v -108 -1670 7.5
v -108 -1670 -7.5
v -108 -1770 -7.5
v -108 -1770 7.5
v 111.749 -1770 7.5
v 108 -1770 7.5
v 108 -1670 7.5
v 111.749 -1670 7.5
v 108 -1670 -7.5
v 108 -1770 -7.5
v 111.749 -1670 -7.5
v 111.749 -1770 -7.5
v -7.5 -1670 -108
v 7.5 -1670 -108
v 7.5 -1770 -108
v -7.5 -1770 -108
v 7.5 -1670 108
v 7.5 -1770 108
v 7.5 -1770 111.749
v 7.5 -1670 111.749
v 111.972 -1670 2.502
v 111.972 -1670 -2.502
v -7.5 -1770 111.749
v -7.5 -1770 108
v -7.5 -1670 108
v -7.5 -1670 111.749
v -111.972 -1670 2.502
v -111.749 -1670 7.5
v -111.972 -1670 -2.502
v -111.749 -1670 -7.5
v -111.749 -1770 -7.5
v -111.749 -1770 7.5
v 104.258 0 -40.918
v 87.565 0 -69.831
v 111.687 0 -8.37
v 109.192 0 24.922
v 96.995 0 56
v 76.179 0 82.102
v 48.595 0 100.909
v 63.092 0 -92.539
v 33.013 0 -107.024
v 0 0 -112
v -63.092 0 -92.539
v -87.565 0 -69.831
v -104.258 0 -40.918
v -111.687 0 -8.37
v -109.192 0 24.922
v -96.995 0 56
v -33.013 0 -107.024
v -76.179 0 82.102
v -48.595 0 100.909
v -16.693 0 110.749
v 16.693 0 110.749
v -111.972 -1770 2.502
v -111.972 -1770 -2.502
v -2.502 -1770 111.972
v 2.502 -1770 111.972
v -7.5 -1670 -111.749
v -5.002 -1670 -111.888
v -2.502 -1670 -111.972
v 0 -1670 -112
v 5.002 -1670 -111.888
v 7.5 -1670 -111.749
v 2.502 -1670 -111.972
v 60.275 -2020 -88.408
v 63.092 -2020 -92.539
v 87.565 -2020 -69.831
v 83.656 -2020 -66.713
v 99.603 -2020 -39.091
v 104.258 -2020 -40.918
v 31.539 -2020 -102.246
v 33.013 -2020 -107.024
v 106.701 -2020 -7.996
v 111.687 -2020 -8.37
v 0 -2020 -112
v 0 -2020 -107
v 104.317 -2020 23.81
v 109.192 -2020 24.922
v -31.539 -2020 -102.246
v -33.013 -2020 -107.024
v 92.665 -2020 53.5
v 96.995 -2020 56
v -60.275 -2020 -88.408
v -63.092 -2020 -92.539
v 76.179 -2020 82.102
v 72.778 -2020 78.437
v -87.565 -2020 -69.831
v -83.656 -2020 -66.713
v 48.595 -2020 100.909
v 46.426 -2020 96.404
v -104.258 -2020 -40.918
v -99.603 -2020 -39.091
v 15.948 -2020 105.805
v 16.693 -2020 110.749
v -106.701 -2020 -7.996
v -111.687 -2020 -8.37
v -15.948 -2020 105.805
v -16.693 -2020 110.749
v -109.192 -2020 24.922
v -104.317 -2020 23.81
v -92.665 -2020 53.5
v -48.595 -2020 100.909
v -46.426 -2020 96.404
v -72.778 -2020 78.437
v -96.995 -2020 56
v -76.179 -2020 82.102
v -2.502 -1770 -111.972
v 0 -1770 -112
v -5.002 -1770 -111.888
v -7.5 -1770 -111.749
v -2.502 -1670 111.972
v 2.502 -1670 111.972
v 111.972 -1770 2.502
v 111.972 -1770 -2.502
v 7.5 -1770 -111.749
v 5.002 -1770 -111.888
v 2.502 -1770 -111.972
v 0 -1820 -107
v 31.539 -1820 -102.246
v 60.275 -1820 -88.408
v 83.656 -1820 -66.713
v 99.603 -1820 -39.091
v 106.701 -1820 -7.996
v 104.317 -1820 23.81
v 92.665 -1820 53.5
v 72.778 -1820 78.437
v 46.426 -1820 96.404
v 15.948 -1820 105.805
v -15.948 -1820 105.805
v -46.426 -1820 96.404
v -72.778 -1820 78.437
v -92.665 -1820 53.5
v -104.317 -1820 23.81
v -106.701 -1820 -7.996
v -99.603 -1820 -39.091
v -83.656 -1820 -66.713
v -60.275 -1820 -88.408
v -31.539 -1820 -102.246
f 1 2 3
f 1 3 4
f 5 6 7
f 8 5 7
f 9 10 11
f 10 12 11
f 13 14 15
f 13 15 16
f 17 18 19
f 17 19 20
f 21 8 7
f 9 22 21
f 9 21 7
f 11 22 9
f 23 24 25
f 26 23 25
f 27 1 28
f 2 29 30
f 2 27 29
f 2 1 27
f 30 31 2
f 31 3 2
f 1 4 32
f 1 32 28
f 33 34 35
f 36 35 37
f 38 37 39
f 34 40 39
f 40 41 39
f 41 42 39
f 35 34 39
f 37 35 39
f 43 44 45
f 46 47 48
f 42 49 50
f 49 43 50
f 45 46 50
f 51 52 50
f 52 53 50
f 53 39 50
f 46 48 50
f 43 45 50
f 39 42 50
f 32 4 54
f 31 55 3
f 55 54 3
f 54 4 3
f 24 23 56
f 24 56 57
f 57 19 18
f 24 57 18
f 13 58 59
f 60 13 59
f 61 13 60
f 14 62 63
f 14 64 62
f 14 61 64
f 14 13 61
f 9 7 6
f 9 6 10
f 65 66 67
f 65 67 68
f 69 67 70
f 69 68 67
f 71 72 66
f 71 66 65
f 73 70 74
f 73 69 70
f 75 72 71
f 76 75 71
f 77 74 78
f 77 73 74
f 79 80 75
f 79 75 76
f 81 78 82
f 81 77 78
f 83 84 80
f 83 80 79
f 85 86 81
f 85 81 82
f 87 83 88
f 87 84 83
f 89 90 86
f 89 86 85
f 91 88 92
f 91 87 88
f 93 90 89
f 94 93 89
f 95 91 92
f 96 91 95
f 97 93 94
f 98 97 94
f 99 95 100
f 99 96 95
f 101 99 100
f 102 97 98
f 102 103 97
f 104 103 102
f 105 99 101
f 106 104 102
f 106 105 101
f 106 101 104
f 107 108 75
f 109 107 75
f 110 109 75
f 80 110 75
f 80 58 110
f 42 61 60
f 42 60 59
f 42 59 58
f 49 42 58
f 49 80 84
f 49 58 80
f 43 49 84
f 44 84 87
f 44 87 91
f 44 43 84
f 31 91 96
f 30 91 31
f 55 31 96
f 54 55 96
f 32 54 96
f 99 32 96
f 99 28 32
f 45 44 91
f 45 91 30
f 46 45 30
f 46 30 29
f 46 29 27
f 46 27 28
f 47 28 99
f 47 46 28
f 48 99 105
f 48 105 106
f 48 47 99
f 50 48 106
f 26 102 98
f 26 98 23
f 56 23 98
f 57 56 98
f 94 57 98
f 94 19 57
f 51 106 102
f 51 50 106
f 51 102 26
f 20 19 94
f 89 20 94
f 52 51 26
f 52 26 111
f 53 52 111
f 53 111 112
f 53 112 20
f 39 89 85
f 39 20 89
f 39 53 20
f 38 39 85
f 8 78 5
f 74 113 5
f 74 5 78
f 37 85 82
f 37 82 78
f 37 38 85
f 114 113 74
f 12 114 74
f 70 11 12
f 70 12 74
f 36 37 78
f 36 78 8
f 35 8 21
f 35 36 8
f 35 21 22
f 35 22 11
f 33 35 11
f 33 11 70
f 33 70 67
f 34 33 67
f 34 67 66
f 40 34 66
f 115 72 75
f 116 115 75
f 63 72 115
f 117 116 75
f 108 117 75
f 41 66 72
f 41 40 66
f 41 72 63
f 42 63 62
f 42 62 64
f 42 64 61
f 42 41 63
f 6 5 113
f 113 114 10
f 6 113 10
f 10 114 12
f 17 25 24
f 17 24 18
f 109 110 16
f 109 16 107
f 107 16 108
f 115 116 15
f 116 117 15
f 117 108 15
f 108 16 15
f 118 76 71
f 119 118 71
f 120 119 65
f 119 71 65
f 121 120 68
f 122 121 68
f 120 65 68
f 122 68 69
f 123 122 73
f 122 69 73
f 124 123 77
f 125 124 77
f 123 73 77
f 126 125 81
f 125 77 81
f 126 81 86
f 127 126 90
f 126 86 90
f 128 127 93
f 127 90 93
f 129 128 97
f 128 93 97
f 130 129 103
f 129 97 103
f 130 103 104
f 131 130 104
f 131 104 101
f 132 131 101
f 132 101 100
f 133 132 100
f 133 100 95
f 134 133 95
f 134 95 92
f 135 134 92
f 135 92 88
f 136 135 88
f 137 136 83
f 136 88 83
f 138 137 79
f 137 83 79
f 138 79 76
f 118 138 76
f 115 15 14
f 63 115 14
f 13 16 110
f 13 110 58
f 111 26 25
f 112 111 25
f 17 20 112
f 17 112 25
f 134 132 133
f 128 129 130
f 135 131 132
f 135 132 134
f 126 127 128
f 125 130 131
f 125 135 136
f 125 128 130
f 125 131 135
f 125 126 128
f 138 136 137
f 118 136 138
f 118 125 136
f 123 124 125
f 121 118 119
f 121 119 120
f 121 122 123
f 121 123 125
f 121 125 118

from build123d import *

# Parameters (mm, degrees)
SKETCH1_W           = 112
SKETCH1_H           = 2020
SKETCH2_W           = 15
SKETCH2_H           = 100
CUT_EXTRUDE1_DEPTH  = 132
SKETCH3_W           = 15
SKETCH3_H           = 100
BOSS_EXTRUDE1_DEPTH = 108
CIRPATTERN1_COUNT   = 4
SKETCH4_R           = 107
CUT_EXTRUDE2_DEPTH  = 200


with BuildPart() as part:
    # Sketch1 → Revolve1 (revolve)
    with BuildSketch(Plane.XY, mode=Mode.PRIVATE) as revolve1_sk:
        with Locations((56, -1010)):
            Rectangle(SKETCH1_W, SKETCH1_H)
    revolve(revolve1_sk.sketch.rotate(Axis((0, -2406.253229974, 0), (0, 1, 0)), 90), axis=Axis((0, -2406.253229974, 0), (0, 1, 0)))

    # Sketch2 → Cut-Extrude1 (cut)
    with BuildSketch(Plane.XY):
        with Locations((0, -1720)):
            Rectangle(SKETCH2_W, SKETCH2_H)
    cut_extrude1 = extrude(amount=-CUT_EXTRUDE1_DEPTH, mode=Mode.SUBTRACT)

    # Sketch3 → Boss-Extrude1 (add)
    with BuildSketch(Plane(origin=(0, 0, 0), x_dir=(-1, 0, 0), z_dir=(0, 0, -1))):
        with Locations((0, -1720)):
            Rectangle(SKETCH3_W, SKETCH3_H)
    boss_extrude1 = extrude(amount=BOSS_EXTRUDE1_DEPTH)

    # CirPattern1: Cut-Extrude1, Boss-Extrude1 ×4 about axis
    cirpattern1_axis = Axis((0, 0, 0), (0, 1, 0))
    add([cut_extrude1.rotate(cirpattern1_axis, i * 360 / CIRPATTERN1_COUNT) for i in range(1, CIRPATTERN1_COUNT)], mode=Mode.SUBTRACT)
    add([boss_extrude1.rotate(cirpattern1_axis, i * 360 / CIRPATTERN1_COUNT) for i in range(1, CIRPATTERN1_COUNT)])

    # Sketch4 → Cut-Extrude2 (cut)
    with BuildSketch(Plane.XZ.offset(2020)):
        with Locations(Location((0, 0, 0), (0, 0, 270))):
            Circle(SKETCH4_R)
    extrude(amount=-CUT_EXTRUDE2_DEPTH, mode=Mode.SUBTRACT)


solid = part.part
